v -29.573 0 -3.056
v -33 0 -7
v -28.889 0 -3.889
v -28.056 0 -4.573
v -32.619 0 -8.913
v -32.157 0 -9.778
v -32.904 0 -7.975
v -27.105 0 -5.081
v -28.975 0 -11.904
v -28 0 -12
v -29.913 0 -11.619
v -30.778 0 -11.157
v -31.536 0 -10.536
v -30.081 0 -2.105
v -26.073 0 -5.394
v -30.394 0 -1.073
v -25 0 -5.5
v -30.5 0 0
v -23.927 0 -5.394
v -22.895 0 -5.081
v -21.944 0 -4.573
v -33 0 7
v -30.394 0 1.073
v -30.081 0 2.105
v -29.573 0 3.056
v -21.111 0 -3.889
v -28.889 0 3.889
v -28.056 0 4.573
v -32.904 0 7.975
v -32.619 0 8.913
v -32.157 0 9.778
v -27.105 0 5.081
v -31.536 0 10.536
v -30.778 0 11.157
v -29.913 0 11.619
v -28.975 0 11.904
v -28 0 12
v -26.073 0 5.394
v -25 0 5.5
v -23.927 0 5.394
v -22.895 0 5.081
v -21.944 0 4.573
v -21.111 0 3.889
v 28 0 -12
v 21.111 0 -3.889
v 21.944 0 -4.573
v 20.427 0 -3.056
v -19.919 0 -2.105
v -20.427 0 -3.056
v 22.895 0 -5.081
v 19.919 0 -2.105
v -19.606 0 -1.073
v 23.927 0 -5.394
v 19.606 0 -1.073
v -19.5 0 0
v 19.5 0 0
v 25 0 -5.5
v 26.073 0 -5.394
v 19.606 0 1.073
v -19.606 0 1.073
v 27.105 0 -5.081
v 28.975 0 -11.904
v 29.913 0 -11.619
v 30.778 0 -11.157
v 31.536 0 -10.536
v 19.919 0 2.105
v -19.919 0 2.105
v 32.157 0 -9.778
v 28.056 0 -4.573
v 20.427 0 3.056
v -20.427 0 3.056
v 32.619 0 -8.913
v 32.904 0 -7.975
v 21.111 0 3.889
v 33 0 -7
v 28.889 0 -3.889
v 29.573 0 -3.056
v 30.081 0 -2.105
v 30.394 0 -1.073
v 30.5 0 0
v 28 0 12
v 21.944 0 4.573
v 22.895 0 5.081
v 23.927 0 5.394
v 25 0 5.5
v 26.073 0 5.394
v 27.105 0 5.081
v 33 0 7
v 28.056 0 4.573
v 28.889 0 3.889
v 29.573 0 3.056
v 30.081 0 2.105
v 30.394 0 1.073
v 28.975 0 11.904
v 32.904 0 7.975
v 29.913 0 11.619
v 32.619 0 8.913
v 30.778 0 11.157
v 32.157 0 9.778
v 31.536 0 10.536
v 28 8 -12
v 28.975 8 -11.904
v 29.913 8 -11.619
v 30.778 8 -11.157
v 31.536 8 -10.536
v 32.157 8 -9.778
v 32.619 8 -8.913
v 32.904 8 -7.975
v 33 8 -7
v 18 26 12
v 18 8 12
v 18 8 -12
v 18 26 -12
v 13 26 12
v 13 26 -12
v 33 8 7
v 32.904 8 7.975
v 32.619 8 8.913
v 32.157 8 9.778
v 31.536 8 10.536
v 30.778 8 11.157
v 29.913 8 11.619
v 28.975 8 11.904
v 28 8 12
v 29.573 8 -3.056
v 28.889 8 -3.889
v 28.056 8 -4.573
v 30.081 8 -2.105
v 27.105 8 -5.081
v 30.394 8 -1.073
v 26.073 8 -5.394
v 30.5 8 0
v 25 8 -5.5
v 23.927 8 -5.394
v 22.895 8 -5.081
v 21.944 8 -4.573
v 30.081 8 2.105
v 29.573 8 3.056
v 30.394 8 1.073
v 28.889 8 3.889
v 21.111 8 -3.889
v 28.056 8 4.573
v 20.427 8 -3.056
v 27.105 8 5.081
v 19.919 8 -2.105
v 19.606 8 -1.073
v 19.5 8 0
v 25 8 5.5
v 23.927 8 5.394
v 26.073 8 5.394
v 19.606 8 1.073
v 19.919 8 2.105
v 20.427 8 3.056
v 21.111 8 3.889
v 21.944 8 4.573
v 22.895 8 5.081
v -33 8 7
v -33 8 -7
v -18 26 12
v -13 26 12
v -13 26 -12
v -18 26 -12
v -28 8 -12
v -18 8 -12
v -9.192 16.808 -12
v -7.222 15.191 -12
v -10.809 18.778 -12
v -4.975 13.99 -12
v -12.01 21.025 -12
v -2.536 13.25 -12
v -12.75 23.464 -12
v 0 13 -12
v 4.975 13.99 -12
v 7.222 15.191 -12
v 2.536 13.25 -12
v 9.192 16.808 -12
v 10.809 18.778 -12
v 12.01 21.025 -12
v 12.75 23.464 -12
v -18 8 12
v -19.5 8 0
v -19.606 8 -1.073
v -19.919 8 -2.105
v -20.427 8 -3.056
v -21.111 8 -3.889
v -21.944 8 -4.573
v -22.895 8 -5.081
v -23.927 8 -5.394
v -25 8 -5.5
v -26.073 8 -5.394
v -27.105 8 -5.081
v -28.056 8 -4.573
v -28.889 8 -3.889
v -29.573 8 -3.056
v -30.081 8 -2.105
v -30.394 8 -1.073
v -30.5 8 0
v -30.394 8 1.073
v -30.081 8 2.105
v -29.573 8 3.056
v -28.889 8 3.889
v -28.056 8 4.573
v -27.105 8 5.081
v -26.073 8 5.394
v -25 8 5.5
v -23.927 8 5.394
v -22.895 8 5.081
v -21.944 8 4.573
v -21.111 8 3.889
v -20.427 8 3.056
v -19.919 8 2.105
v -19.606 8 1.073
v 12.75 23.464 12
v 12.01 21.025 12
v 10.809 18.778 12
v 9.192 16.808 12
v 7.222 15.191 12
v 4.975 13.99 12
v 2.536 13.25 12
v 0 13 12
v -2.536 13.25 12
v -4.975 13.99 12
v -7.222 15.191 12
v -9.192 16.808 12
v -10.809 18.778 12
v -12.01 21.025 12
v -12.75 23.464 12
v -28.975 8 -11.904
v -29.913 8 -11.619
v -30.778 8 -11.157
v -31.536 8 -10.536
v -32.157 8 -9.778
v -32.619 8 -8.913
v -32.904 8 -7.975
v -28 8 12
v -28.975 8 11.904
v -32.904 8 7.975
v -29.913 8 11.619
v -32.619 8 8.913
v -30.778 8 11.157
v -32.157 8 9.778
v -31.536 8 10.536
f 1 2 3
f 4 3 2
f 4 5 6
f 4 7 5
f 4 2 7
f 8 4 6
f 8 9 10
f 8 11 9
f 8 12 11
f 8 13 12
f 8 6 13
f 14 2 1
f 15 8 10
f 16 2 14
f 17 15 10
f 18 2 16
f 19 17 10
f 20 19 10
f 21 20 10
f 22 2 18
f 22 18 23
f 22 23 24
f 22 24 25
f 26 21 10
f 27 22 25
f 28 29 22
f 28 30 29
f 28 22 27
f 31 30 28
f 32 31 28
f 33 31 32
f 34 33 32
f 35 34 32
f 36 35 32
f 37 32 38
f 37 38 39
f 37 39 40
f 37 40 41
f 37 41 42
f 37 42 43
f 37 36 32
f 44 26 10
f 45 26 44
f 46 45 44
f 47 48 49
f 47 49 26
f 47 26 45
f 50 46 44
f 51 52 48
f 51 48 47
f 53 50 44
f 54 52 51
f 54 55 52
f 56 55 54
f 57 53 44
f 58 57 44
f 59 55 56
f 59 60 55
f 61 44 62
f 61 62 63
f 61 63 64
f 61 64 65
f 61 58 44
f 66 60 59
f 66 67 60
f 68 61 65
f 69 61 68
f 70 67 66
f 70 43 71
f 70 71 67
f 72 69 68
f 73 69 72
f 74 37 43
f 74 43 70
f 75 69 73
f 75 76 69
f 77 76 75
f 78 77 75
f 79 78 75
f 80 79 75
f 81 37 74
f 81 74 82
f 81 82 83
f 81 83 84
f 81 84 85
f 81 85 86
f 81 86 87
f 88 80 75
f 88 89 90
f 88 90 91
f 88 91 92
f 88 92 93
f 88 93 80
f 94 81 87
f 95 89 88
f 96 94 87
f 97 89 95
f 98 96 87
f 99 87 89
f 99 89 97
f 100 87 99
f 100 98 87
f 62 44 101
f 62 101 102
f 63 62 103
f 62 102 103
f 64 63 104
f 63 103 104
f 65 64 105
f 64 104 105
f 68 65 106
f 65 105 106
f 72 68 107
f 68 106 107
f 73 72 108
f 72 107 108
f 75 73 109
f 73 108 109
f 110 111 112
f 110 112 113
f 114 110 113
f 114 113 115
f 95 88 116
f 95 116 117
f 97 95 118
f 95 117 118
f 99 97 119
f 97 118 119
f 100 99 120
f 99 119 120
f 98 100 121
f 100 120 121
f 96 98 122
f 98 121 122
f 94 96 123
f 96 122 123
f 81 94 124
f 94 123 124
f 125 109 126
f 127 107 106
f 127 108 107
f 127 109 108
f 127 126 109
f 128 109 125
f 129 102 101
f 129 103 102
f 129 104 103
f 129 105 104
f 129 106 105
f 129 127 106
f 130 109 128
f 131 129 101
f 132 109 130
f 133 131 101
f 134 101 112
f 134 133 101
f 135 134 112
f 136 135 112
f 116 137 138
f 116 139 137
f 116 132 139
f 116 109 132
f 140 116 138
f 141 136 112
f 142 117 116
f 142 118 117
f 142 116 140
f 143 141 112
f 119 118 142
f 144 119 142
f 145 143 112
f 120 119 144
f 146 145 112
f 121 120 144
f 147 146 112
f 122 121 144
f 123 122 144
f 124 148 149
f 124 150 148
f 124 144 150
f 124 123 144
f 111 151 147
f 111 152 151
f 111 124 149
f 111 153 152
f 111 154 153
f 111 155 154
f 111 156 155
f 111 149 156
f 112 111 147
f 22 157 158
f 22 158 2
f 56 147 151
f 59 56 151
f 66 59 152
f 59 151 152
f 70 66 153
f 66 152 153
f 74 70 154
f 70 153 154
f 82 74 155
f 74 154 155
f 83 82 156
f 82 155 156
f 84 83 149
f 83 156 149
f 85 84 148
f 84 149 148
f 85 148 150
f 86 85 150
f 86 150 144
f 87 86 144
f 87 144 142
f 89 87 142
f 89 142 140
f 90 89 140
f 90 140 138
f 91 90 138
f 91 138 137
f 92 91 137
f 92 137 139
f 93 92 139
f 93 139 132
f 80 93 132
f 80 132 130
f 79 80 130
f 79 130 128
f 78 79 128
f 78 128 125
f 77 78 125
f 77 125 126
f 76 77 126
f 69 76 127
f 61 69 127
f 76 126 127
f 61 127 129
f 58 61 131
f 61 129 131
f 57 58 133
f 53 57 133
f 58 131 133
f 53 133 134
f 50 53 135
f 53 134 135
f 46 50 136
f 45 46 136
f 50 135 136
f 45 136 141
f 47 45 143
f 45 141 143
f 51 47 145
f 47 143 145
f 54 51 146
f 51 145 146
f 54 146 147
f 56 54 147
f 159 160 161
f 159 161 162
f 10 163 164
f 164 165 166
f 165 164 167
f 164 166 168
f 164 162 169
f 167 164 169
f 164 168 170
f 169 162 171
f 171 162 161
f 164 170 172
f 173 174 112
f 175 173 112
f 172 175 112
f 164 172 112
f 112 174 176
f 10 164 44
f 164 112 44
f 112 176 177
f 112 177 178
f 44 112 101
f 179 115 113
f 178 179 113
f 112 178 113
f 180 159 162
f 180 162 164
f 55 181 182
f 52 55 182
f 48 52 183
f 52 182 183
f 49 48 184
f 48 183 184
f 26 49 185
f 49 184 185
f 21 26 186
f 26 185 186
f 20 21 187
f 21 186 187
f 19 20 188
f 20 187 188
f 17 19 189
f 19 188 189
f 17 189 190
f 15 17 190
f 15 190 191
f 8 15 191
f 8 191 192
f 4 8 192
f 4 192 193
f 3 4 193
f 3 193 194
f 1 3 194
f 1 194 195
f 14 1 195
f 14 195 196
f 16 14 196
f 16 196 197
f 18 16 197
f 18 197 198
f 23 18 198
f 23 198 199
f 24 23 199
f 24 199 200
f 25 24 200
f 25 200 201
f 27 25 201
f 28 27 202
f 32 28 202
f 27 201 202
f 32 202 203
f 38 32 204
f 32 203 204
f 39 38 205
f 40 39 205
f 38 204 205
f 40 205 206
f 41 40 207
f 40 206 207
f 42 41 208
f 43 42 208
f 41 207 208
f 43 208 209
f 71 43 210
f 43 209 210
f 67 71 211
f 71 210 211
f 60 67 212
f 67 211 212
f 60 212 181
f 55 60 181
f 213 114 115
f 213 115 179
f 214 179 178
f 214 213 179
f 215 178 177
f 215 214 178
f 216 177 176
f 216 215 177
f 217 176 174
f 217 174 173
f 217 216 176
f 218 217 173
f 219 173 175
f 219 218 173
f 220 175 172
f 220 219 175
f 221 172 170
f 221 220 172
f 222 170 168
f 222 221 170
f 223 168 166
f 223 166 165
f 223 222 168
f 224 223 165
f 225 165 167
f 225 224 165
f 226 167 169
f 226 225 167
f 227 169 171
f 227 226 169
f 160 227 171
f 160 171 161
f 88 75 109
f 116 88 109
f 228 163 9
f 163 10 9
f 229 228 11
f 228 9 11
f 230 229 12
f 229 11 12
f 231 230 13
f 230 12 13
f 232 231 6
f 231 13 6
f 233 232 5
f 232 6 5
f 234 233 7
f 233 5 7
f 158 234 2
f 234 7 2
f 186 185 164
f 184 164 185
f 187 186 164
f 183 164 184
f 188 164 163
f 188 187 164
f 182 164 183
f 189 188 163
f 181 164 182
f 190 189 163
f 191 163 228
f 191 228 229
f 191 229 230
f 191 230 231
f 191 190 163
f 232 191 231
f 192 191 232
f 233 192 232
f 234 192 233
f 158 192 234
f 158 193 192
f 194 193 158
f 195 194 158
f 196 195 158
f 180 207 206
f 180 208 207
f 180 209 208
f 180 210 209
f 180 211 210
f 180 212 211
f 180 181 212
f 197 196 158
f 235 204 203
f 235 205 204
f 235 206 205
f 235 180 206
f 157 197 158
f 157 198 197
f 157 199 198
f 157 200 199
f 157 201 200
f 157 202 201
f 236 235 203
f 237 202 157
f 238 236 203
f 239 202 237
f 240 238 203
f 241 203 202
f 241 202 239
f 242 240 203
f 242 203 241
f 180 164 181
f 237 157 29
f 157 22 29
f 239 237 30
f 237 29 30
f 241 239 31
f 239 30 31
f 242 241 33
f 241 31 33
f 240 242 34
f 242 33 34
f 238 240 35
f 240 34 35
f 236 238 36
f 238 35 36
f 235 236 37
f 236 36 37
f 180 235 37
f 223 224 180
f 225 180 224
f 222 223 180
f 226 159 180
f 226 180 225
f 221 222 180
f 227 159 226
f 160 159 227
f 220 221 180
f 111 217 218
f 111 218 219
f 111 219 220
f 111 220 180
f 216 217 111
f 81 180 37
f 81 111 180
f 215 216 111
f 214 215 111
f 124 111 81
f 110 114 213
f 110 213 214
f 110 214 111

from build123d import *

# Parameters (mm, degrees)
EXTRUDE_1_DEPTH     = 12
SKETCH_2_R          = 5.5
CUT_EXTRUDE_1_DEPTH = 40.458839314
FILLET_1_R          = 5


with BuildPart() as part:
    # 草图1 → 凸台-拉伸1 (new, symmetric)
    with BuildSketch(Plane.XY):
        with BuildLine():
            Line((-33, 0), (33, 0))
            Line((33, 0), (33, 8))
            Line((33, 8), (18, 8))
            Line((18, 8), (18, 26))
            Line((18, 26), (13, 26))
            ThreePointArc((13, 26), (0, 13), (-13, 26))
            Line((-13, 26), (-18, 26))
            Line((-18, 26), (-18, 8))
            Line((-18, 8), (-33, 8))
            Line((-33, 8), (-33, 0))
        make_face()
    extrude(amount=EXTRUDE_1_DEPTH, both=True)

    # 草图2 → 切除-拉伸1 (cut, through all)
    with BuildSketch(Plane(origin=(0, 8, 0), x_dir=(1, 0, 0), z_dir=(0, 1, 0))):
        with Locations(Location((25, 0, 0), (0, 0, 180))):
            Circle(SKETCH_2_R)
        with Locations((-25, 0)):
            Circle(SKETCH_2_R)
    extrude(amount=-CUT_EXTRUDE_1_DEPTH, mode=Mode.SUBTRACT)

    # 圆角1
    fillet_1_edges = [part.edges().sort_by_distance(p)[0] for p in [
        (33, 4, -12),
        (-33, 4, -12),
        (-33, 4, 12),
        (33, 4, 12),
    ]]
    fillet(fillet_1_edges, radius=FILLET_1_R)


solid = part.part
